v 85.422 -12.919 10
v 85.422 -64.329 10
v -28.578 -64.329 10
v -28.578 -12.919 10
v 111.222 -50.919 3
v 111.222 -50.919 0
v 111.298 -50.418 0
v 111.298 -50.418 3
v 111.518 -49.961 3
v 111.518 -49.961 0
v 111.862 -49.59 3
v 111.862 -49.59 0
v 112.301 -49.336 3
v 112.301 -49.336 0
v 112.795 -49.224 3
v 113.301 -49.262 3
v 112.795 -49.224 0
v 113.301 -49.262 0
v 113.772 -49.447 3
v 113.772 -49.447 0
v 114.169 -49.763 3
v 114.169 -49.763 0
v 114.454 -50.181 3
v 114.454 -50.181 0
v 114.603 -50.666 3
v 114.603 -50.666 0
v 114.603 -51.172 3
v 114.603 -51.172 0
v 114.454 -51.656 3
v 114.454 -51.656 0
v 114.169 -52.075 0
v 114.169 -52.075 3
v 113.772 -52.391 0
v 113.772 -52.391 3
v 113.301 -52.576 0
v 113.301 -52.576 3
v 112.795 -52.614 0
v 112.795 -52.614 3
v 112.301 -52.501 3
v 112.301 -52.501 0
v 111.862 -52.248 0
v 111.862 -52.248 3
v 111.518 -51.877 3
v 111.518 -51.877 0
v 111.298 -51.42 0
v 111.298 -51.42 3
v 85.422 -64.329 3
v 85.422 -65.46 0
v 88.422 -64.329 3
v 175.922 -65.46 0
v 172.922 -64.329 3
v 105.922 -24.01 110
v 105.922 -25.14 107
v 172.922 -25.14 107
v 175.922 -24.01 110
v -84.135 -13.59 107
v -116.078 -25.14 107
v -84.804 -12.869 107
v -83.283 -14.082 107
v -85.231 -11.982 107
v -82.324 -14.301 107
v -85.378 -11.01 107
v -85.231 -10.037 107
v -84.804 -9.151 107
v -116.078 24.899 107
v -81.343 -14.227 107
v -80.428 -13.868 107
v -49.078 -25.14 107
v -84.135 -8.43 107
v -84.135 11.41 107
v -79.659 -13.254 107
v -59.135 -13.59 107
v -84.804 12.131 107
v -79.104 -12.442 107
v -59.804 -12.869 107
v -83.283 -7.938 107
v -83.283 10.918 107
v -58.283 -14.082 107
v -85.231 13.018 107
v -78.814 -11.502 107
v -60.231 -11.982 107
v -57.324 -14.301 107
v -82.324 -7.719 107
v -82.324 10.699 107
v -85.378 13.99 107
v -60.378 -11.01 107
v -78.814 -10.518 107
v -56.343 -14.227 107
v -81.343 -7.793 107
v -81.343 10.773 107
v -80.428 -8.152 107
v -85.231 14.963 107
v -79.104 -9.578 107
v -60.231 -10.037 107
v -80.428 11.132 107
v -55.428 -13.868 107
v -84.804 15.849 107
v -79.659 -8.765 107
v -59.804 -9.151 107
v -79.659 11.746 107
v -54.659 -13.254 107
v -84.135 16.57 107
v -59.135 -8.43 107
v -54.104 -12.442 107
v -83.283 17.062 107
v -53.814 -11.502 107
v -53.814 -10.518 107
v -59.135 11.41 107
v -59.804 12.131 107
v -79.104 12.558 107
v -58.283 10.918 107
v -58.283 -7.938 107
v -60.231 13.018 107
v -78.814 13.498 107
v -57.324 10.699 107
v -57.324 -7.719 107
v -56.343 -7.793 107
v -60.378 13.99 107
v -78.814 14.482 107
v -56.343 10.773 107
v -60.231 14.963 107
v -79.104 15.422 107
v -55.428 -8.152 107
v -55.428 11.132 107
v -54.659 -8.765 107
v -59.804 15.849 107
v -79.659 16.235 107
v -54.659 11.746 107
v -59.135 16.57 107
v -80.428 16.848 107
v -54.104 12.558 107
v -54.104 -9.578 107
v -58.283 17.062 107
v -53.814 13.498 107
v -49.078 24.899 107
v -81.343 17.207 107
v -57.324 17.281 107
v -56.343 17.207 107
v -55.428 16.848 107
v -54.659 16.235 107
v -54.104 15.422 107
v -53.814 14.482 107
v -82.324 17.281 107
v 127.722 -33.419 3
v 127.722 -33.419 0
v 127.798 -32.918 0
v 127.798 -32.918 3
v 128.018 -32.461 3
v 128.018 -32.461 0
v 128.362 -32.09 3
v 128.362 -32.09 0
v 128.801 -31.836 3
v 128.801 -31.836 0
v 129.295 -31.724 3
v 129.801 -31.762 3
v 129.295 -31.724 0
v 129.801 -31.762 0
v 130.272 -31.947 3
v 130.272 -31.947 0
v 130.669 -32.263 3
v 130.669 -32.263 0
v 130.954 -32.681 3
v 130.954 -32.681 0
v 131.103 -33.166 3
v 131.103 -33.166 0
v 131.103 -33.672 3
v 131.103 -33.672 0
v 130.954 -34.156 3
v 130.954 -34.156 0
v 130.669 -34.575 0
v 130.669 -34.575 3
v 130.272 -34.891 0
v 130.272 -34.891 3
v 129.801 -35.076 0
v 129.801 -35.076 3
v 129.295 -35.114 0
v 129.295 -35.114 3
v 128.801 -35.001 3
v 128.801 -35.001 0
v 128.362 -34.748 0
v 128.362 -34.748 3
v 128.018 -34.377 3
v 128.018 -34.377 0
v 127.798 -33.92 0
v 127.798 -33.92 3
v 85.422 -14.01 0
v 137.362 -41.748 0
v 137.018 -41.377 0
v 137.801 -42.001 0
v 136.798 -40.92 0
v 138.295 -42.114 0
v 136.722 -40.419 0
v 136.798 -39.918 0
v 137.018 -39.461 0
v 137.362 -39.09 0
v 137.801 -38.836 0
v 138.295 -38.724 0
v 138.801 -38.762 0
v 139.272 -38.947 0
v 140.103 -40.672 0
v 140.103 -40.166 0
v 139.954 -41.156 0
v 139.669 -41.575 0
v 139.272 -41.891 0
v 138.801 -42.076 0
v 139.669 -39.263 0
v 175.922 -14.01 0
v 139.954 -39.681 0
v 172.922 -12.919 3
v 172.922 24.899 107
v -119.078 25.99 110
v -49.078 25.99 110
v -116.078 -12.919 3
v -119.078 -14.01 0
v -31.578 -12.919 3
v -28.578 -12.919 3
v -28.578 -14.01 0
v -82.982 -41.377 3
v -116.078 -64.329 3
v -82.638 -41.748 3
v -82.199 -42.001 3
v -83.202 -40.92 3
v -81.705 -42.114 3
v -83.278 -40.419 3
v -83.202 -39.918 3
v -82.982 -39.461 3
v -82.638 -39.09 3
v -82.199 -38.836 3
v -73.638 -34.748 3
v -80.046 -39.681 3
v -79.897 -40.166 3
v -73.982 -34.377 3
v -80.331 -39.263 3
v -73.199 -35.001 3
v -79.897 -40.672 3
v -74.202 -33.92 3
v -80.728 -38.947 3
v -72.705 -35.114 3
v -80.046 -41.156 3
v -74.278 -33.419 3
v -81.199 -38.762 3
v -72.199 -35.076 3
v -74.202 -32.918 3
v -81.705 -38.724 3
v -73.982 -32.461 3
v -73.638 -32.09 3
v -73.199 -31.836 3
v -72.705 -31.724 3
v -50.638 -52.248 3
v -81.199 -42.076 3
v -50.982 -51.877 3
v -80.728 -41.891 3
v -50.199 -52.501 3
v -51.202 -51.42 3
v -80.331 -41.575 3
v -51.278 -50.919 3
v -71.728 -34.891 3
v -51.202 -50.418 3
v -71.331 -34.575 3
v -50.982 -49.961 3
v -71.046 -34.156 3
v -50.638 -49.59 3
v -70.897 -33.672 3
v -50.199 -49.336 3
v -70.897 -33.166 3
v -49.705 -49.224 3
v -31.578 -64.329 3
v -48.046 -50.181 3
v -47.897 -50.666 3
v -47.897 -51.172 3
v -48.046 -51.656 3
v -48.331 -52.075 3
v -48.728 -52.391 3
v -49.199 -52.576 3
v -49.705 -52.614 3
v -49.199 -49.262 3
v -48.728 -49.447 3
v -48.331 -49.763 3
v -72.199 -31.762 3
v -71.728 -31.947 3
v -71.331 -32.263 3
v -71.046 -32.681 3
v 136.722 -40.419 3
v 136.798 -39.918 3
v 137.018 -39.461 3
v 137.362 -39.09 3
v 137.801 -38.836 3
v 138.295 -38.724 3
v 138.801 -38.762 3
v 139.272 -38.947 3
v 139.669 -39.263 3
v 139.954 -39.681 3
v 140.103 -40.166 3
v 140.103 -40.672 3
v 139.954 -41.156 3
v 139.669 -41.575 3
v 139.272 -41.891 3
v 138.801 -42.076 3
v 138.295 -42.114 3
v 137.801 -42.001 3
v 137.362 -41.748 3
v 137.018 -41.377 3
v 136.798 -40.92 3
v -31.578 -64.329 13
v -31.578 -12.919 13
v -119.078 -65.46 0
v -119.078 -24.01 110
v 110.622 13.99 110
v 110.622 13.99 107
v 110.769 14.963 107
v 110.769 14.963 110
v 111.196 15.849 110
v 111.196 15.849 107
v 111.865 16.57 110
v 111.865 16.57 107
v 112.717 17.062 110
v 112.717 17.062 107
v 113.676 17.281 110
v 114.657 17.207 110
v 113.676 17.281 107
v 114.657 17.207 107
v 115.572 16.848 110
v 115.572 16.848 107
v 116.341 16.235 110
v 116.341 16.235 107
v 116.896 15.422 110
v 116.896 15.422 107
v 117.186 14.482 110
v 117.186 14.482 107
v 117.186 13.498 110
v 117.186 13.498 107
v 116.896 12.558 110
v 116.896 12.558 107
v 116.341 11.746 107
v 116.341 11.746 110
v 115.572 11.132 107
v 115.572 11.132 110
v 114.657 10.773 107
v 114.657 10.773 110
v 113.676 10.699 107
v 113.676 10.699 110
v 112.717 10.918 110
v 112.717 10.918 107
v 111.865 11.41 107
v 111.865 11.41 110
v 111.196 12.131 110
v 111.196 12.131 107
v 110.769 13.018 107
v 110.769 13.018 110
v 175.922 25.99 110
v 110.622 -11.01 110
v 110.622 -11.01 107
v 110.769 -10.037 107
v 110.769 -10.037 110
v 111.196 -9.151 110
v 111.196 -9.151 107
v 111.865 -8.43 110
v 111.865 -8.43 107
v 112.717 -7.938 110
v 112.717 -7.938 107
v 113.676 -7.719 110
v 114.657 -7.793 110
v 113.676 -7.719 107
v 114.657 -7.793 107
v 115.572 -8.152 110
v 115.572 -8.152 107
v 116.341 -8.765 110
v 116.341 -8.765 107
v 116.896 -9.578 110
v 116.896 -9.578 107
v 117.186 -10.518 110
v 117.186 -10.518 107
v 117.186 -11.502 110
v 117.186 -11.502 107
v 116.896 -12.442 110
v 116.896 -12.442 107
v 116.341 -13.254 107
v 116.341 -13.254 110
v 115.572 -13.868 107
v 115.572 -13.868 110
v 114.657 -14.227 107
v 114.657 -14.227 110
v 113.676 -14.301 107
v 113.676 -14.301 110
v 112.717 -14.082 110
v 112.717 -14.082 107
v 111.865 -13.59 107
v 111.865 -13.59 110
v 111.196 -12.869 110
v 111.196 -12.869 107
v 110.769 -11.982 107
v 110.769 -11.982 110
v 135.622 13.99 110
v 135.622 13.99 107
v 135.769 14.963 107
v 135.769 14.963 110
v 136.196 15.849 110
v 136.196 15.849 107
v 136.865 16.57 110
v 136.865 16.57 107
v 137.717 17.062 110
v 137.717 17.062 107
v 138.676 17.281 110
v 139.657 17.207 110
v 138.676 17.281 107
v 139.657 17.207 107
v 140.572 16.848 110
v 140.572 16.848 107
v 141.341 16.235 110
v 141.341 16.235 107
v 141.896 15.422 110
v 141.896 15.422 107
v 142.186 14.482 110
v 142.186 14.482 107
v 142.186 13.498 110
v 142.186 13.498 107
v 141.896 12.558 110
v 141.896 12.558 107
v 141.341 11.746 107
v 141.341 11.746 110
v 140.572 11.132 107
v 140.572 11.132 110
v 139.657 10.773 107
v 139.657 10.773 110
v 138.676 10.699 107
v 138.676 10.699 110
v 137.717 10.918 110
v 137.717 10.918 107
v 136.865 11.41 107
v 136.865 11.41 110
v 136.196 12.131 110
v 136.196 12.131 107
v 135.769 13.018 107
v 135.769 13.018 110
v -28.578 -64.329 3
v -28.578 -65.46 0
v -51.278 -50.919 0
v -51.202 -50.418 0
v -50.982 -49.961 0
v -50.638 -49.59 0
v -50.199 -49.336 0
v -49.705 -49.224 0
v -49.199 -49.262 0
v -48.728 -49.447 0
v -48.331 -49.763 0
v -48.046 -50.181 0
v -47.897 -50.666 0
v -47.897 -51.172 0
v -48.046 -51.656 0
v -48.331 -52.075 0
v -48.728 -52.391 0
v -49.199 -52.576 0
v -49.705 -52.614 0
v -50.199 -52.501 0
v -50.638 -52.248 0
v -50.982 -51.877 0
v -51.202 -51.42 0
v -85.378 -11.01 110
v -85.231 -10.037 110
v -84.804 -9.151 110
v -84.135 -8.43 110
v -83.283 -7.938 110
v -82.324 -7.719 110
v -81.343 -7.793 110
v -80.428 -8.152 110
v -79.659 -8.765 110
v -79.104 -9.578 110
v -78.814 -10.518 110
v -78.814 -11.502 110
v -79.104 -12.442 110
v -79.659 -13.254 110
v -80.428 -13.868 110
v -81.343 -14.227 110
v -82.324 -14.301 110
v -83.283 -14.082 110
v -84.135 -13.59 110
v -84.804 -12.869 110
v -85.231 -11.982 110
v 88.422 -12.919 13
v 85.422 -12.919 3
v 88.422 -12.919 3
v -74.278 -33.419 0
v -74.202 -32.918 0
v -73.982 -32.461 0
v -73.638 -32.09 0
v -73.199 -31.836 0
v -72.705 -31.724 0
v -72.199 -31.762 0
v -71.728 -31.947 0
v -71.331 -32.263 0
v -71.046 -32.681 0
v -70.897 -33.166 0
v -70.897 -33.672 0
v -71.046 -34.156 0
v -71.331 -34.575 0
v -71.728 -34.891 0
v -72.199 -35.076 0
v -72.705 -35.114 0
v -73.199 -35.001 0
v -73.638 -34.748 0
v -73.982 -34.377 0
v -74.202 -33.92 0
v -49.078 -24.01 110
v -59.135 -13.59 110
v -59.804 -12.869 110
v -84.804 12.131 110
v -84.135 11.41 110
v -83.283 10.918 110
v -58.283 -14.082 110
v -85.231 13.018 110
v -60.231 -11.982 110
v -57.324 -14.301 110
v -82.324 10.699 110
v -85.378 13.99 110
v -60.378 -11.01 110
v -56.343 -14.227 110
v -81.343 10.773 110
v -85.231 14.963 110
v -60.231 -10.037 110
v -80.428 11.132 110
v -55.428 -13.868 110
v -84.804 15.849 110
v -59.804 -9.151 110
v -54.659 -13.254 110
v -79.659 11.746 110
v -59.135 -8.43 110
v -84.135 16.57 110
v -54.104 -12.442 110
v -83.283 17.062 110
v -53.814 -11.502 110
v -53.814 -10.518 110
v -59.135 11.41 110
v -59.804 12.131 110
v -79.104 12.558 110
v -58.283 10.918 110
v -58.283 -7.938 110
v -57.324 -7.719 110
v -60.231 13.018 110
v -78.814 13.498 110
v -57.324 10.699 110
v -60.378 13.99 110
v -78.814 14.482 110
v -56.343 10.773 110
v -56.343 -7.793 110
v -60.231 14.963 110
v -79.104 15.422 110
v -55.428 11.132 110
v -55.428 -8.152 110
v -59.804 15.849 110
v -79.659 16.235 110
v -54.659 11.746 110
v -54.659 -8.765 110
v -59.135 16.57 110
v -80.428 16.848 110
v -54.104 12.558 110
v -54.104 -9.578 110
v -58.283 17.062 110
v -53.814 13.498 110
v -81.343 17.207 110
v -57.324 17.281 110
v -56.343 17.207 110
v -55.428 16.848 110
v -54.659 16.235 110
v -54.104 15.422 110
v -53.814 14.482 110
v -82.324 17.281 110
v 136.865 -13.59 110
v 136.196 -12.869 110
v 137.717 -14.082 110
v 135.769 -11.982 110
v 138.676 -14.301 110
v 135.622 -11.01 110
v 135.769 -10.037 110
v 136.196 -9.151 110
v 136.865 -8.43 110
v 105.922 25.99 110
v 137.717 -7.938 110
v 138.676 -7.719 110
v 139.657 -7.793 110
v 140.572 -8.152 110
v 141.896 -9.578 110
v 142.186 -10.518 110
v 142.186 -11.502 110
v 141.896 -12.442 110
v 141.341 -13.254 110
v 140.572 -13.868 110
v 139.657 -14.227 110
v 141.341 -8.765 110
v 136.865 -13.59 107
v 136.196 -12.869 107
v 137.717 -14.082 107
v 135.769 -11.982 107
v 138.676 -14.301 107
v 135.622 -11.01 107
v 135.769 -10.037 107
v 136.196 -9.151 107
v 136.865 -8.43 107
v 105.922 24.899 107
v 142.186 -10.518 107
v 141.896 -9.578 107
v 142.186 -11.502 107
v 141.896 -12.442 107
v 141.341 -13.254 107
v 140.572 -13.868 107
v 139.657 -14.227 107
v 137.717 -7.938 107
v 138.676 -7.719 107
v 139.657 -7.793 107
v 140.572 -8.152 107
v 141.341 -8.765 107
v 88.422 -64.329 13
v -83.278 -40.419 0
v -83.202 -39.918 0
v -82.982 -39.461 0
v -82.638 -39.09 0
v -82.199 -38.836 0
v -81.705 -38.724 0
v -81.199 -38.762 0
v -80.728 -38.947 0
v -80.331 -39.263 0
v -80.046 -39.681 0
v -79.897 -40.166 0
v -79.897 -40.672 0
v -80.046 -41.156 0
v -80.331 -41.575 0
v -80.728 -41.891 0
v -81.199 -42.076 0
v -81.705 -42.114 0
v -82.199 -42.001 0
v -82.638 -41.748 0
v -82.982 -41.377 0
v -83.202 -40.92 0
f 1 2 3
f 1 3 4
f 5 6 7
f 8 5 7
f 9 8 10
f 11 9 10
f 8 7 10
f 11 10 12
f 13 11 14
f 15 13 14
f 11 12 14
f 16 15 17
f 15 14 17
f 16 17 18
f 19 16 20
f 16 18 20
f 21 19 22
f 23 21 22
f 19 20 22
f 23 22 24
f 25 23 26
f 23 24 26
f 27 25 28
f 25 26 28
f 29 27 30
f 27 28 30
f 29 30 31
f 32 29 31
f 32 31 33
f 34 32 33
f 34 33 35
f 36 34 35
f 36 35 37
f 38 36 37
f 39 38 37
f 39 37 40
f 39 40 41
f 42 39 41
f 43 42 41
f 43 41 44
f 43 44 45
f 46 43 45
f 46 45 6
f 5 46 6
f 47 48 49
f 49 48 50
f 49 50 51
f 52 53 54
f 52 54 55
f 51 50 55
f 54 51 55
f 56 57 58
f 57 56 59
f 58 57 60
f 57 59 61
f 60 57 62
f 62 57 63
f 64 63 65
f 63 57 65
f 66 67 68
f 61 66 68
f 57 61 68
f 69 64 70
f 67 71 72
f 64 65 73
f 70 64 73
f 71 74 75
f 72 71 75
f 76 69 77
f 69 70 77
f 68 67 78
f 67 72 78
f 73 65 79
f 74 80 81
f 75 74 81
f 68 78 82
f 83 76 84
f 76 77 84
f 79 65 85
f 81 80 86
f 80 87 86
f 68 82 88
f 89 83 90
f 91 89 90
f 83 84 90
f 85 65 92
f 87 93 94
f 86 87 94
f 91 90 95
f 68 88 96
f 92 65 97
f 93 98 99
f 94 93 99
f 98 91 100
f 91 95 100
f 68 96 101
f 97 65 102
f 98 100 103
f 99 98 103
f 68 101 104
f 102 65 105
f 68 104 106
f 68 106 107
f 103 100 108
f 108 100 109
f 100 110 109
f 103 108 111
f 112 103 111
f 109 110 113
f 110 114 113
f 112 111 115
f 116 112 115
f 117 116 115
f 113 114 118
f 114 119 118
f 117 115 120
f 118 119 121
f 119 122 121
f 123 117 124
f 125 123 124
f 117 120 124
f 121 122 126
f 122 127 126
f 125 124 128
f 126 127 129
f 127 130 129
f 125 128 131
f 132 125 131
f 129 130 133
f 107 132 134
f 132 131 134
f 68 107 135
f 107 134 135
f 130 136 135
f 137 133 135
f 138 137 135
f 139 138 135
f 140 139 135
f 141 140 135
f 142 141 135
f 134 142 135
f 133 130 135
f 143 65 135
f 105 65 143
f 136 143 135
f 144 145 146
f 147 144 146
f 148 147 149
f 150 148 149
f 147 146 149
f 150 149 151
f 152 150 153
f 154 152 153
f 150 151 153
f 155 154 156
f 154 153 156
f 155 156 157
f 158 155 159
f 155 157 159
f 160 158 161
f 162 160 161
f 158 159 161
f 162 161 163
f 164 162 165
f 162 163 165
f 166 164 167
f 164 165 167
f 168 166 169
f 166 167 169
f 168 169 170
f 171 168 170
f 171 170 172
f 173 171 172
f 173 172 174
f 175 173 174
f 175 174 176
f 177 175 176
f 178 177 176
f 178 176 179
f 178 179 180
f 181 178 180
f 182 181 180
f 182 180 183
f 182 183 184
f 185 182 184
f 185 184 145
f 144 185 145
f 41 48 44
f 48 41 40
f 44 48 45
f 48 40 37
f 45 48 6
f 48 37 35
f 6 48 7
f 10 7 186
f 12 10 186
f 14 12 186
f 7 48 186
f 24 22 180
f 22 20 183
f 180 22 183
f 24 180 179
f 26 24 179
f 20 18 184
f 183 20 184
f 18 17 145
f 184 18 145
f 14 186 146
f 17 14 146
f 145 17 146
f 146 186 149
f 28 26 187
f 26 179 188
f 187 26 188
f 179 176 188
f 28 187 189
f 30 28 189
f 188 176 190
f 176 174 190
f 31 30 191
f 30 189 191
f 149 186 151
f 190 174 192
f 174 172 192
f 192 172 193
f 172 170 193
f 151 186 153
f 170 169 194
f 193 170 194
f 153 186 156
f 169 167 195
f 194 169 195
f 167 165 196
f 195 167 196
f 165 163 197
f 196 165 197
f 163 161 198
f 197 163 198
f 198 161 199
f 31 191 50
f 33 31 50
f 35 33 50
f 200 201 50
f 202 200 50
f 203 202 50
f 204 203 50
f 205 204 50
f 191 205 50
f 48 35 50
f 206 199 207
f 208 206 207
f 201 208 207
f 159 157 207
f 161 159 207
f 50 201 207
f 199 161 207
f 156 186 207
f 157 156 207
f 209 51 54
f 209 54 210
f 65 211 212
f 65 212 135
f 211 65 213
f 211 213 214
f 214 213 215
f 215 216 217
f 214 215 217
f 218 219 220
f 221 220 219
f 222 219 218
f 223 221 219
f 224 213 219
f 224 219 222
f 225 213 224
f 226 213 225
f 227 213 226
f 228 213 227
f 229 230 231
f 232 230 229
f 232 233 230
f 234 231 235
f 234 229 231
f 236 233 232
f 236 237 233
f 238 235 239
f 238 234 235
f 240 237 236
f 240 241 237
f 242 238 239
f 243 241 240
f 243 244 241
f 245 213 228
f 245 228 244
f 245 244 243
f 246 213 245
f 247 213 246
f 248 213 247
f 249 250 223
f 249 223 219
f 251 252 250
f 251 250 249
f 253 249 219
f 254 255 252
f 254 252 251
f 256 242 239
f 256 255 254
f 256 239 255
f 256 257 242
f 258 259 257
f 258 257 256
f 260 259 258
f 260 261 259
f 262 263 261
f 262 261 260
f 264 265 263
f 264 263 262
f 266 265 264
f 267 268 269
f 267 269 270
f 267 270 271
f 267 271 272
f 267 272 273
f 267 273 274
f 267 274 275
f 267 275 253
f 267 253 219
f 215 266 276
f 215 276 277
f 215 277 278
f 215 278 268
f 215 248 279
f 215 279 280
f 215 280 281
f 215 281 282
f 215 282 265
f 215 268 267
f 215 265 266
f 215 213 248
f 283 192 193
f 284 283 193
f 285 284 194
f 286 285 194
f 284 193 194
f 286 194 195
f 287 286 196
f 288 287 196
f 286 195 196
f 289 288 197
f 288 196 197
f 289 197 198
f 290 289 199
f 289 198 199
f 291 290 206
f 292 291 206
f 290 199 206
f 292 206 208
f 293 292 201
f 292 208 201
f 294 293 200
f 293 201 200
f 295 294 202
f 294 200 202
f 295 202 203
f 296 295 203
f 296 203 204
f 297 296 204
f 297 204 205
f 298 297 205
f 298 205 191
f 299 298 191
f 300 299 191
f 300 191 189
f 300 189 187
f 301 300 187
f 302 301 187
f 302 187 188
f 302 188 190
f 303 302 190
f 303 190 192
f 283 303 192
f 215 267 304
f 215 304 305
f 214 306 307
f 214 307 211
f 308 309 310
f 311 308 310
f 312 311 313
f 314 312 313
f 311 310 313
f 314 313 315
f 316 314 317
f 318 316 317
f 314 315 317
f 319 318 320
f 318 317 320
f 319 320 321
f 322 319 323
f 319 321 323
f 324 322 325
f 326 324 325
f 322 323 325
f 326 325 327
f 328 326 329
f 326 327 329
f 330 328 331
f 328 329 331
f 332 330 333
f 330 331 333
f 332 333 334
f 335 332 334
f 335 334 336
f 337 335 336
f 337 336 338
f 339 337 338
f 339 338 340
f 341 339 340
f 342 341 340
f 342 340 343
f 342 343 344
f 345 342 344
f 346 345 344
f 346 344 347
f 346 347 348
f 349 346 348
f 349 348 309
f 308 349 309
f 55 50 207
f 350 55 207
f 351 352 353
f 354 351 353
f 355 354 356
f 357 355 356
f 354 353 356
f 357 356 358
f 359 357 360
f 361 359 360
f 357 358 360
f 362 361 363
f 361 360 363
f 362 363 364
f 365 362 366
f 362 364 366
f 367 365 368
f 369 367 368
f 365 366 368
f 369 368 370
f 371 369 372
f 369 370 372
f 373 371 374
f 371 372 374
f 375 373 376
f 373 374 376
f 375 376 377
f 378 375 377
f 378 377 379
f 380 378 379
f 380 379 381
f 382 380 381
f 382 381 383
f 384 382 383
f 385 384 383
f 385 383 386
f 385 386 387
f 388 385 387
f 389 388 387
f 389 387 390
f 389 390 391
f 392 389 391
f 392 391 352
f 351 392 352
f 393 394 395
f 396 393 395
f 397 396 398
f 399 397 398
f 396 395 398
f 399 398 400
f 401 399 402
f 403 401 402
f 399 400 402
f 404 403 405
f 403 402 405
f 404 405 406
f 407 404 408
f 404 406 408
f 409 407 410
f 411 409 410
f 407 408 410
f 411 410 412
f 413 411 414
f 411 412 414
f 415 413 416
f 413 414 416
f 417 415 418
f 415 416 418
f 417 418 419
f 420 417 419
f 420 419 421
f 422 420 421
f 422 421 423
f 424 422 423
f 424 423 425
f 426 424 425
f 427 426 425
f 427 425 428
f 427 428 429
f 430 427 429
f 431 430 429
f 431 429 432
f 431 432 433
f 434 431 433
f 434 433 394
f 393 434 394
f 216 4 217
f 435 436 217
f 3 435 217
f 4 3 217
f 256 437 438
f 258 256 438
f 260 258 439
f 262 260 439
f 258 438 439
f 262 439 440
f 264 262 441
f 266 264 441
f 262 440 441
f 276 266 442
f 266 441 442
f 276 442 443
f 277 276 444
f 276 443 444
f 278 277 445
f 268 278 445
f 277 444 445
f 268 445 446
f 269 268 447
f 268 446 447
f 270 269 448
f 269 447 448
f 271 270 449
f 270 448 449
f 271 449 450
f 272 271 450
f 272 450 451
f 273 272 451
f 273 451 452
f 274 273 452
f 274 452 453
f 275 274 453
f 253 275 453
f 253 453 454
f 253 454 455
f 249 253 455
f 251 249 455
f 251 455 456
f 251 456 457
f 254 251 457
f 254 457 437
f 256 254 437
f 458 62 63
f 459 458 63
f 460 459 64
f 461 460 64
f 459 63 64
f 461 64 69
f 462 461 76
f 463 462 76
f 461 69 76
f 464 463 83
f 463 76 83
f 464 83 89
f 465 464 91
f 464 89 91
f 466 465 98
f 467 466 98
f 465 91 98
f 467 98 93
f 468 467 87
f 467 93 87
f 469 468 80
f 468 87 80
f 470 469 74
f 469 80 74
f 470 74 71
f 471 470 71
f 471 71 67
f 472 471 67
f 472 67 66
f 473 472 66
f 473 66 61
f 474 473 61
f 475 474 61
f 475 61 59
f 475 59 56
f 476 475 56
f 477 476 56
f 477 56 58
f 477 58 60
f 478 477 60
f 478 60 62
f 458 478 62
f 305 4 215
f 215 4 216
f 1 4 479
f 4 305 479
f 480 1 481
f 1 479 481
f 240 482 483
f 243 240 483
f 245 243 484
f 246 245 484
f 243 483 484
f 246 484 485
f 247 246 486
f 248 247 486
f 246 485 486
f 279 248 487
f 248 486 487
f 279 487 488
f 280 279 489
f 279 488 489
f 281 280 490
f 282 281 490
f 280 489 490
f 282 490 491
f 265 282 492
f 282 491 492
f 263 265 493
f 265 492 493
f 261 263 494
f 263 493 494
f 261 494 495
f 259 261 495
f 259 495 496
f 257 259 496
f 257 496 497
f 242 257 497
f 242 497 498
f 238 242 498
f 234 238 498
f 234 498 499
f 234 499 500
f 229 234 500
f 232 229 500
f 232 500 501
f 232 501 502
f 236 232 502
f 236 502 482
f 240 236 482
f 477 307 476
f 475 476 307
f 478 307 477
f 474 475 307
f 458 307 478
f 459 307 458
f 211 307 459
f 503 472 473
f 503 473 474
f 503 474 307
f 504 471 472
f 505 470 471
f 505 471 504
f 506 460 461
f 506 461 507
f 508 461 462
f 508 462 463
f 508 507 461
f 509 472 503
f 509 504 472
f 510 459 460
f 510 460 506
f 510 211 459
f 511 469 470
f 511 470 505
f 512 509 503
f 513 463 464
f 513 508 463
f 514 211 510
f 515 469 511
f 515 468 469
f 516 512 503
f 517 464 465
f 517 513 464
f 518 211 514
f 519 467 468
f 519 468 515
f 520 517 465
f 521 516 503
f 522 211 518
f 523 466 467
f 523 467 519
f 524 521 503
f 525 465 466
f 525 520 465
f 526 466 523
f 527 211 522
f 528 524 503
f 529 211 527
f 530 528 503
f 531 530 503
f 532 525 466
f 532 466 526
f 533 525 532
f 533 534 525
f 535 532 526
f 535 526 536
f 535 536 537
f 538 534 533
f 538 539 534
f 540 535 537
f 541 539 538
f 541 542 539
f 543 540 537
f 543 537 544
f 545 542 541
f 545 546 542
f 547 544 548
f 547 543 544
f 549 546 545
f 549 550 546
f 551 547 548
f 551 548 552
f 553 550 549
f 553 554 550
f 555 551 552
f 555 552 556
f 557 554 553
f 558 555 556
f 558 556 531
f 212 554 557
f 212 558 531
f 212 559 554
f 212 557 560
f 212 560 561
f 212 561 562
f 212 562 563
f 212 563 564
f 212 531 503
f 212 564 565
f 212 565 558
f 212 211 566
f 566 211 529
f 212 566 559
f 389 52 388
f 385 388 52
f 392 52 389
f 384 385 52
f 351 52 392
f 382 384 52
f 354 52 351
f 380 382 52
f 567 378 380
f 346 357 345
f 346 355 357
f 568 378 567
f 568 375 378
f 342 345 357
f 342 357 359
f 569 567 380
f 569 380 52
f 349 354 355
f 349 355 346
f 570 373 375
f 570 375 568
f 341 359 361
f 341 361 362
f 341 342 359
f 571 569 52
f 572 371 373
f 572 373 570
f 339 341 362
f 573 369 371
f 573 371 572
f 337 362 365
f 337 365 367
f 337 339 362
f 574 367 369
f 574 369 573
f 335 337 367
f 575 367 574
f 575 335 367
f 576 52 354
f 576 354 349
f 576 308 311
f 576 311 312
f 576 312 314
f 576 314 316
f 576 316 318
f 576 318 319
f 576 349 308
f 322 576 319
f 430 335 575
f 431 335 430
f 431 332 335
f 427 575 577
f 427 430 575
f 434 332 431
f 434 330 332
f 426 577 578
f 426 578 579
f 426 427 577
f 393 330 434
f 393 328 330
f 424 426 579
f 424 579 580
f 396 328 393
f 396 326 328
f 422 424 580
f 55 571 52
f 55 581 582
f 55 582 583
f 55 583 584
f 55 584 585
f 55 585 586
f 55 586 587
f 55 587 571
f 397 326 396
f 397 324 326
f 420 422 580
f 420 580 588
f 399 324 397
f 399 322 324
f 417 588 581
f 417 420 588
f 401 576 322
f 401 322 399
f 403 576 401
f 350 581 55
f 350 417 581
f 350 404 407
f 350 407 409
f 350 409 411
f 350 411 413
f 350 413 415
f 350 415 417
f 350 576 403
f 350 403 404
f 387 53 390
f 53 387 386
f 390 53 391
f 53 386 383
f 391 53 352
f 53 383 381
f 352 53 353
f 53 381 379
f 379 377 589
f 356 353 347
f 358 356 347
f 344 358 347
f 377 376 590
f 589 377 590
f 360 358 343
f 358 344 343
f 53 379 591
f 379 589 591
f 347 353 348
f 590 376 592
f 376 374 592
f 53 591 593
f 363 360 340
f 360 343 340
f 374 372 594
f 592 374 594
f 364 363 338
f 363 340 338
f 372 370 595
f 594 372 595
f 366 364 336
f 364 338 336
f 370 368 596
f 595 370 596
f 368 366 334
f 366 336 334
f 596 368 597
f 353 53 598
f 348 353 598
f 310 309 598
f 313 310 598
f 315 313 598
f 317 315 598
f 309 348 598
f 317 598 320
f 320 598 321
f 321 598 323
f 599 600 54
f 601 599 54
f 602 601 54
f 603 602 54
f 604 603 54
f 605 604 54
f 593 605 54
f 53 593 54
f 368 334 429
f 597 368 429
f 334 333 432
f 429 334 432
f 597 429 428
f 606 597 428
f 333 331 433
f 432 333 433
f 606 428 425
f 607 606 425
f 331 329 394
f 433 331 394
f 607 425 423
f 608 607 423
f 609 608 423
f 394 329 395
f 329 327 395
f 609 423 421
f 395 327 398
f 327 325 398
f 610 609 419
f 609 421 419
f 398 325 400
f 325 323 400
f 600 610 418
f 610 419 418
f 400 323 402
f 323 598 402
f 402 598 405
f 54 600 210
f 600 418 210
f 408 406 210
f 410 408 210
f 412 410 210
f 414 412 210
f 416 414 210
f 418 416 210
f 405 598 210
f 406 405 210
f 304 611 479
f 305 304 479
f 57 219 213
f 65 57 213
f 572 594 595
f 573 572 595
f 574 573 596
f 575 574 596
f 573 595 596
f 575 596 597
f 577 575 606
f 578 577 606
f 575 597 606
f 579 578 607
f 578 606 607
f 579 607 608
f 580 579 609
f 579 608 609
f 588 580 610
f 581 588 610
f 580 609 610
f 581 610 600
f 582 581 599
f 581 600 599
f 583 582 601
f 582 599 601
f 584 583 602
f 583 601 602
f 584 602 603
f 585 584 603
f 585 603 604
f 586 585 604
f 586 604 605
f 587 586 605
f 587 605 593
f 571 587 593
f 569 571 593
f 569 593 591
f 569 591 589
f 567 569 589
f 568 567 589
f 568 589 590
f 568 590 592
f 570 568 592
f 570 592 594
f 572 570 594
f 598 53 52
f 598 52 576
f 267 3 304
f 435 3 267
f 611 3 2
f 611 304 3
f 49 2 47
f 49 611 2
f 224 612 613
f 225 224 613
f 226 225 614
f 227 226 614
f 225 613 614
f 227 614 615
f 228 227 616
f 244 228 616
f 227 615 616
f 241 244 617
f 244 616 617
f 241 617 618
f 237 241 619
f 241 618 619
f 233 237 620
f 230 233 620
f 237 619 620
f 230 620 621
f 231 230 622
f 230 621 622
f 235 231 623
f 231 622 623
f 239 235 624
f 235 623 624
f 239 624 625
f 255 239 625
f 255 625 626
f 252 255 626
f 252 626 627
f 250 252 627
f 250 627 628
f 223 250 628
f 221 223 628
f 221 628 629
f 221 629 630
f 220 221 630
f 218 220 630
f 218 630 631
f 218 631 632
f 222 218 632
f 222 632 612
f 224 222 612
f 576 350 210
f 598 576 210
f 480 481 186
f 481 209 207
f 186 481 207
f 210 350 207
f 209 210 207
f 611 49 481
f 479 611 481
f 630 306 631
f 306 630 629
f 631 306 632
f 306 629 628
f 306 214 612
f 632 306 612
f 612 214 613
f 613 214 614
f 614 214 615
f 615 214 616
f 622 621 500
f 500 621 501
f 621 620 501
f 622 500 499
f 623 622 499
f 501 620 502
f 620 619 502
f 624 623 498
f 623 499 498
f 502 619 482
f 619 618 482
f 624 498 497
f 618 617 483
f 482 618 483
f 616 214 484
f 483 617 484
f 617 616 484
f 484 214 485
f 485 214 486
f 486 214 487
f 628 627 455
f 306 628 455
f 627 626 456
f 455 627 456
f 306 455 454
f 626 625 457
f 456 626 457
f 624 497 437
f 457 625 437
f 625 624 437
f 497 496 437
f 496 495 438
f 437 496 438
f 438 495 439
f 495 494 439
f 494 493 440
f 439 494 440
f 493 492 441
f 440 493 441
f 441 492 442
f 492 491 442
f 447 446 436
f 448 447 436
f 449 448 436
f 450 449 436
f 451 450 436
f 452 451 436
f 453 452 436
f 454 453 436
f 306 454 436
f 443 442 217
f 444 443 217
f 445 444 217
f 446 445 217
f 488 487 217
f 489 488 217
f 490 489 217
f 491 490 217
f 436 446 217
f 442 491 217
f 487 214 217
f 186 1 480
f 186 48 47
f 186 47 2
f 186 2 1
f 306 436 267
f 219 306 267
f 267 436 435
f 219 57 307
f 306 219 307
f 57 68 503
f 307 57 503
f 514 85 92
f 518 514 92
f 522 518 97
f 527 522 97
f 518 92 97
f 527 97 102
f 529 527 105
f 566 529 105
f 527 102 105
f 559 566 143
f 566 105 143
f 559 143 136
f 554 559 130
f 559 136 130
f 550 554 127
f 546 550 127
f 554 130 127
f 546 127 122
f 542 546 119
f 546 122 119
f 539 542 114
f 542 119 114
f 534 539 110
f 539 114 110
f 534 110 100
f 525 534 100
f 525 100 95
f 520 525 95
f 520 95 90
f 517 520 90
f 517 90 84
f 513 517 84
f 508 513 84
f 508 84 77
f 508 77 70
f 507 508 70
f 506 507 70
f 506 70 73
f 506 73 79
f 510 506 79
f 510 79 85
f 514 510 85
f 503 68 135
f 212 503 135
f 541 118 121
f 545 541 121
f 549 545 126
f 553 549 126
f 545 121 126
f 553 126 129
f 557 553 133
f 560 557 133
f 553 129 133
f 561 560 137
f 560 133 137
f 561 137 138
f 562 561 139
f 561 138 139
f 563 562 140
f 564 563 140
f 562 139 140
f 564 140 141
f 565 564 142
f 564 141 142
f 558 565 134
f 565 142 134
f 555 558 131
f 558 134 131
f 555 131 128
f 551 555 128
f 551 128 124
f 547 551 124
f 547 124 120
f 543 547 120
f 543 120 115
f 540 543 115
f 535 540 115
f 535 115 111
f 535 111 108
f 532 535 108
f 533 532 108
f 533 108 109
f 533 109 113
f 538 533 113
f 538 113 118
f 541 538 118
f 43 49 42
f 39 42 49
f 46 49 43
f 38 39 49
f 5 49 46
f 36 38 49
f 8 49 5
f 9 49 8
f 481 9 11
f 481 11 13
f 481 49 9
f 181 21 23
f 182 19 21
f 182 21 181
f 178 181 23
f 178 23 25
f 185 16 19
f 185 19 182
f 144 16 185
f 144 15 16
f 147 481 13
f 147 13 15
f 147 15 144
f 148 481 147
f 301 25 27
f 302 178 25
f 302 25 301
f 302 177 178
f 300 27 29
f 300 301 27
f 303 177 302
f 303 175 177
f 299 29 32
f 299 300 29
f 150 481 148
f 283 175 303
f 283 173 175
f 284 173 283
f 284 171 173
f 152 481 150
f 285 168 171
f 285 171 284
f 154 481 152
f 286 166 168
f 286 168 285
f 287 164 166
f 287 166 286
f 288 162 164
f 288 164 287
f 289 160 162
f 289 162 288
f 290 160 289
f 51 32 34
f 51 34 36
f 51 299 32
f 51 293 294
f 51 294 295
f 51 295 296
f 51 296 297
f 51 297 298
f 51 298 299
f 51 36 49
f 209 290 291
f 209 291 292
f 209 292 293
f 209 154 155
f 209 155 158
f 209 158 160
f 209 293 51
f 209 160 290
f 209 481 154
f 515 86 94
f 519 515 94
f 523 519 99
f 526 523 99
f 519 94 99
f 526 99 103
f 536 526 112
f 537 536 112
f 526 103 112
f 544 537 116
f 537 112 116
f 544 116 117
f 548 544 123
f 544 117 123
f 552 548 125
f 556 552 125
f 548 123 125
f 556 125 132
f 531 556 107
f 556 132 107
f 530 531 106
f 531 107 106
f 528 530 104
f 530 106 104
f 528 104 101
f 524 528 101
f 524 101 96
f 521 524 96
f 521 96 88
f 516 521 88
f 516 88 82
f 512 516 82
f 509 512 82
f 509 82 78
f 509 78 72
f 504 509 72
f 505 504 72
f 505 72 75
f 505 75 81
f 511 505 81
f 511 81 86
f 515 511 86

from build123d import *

# Parameters (mm, degrees)
SKETCH_1_W             = 295
SKETCH_1_H             = 91.45
EXTRUDE_1_DEPTH        = 3
SKETCH_4_W             = 3
SKETCH_4_H             = 91.45
EXTRUDE_2_DEPTH        = 104
SKETCH_5_W             = 70
SKETCH_5_H             = 91.45
EXTRUDE_3_DEPTH        = 3
CUT_EXTRUDE_1_DEPTH    = 322.574228766
HOLE_WIZARD_M6_1_D     = 6.6
HOLE_WIZARD_M6_1_DEPTH = 3
HOLE_WIZARD_M3_1_D     = 3.4
SKETCH_39_W            = 3
SKETCH_39_H            = 51.410454545
EXTRUDE_5_DEPTH        = 10
SKETCH_42_W            = 3
SKETCH_42_H            = 51.410454545
EXTRUDE_6_DEPTH        = 117
CUT_EXTRUDE_5_REACH    = 219.563
SKETCH_44_W            = 114
SKETCH_44_H            = 52.54090909


with BuildPart() as part:
    # ｽｹｯﾁ1 → ﾎﾞｽ - 押し出し1 (new body)
    with BuildSketch(Plane.XY):
        with Locations((28.42242268, -19.734793814)):
            Rectangle(SKETCH_1_W, SKETCH_1_H)
    extrude(amount=EXTRUDE_1_DEPTH)

    # ｽｹｯﾁ4 → ﾎﾞｽ - 押し出し2 (add)
    with BuildSketch(Plane.XY.offset(3)):
        with Locations((-117.57757732, -19.734793814)):
            Rectangle(SKETCH_4_W, SKETCH_4_H)
        with Locations((174.42242268, -19.734793814)):
            Rectangle(SKETCH_4_W, SKETCH_4_H)
    extrude(amount=EXTRUDE_2_DEPTH)

    # ｽｹｯﾁ5 → ﾎﾞｽ - 押し出し3 (add)
    with BuildSketch(Plane.XY.offset(107)):
        with Locations((-84.07757732, -19.734793814)):
            Rectangle(SKETCH_5_W, SKETCH_5_H)
        with Locations((140.92242268, -19.734793814)):
            Rectangle(SKETCH_5_W, SKETCH_5_H)
    extrude(amount=EXTRUDE_3_DEPTH)

    # ｽｹｯﾁ24 → ｶｯﾄ - 押し出し1 (cut, through all)
    with BuildSketch(Plane(origin=(175.92242268, 0, 0), x_dir=(0, 0, -1), z_dir=(1, 0, 0))):
        Polygon((-110, 25.990206186), (0, -14.009793814), (0, 25.990206186), align=None)
        Polygon((-110, -65.459793814), (0, -65.459793814), (-110, -24.009793814), align=None)
    extrude(amount=-CUT_EXTRUDE_1_DEPTH, mode=Mode.SUBTRACT)

    # M6 すきま穴1
    with Locations(Plane.XY.offset(110)):
        with Locations((113.92242268, 13.990206186), (113.92242268, -11.009793814), (138.92242268, -11.009793814), (138.92242268, 13.990206186), (-57.07757732, 13.990206186), (-57.07757732, -11.009793814), (-82.07757732, -11.009793814), (-82.07757732, 13.990206186)):
            Hole(HOLE_WIZARD_M6_1_D / 2, depth=HOLE_WIZARD_M6_1_DEPTH)

    # M3 すきま穴1 (through all)
    with Locations(Plane.XY.offset(3)):
        with Locations((-72.57757732, -33.418884724), (-81.57757732, -40.418884724), (-49.57757732, -50.918884724), (138.42242268, -40.418884724), (129.42242268, -33.418884724), (112.92242268, -50.918884724)):
            Hole(HOLE_WIZARD_M3_1_D / 2)

    # ｽｹｯﾁ39 → ﾎﾞｽ - 押し出し5 (add)
    with BuildSketch(Plane.XY.offset(3)):
        with Locations((-30.07757732, -38.624111997)):
            Rectangle(SKETCH_39_W, SKETCH_39_H)
        with Locations((86.92242268, -38.624111997)):
            Rectangle(SKETCH_39_W, SKETCH_39_H)
    extrude(amount=EXTRUDE_5_DEPTH)

    # ｽｹｯﾁ42 → ﾎﾞｽ - 押し出し6 (add)
    with BuildSketch(Plane(origin=(88.42242268, 0, 0), x_dir=(0, 0, -1), z_dir=(1, 0, 0))):
        with Locations((-11.5, -38.624111997)):
            Rectangle(SKETCH_42_W, SKETCH_42_H)
    extrude(amount=-EXTRUDE_6_DEPTH)

    # ｽｹｯﾁ44 → ｶｯﾄ - 押し出し5 (cut, up to next)
    with BuildSketch(Plane(origin=(0, 0, 0), x_dir=(-1, 0, 0), z_dir=(0, 0, -1)), mode=Mode.PRIVATE) as cut_extrude_5_sk1:
        with Locations((-28.42242268, -39.189339269)):
            Rectangle(SKETCH_44_W, SKETCH_44_H)
    cut_extrude_5_tool1 = extrude(cut_extrude_5_sk1.sketch, amount=-CUT_EXTRUDE_5_REACH, mode=Mode.PRIVATE) & part.part
    add(cut_extrude_5_tool1.solids().sort_by_distance((28.422423, -39.189339, 0))[0], mode=Mode.SUBTRACT)


solid = part.part
